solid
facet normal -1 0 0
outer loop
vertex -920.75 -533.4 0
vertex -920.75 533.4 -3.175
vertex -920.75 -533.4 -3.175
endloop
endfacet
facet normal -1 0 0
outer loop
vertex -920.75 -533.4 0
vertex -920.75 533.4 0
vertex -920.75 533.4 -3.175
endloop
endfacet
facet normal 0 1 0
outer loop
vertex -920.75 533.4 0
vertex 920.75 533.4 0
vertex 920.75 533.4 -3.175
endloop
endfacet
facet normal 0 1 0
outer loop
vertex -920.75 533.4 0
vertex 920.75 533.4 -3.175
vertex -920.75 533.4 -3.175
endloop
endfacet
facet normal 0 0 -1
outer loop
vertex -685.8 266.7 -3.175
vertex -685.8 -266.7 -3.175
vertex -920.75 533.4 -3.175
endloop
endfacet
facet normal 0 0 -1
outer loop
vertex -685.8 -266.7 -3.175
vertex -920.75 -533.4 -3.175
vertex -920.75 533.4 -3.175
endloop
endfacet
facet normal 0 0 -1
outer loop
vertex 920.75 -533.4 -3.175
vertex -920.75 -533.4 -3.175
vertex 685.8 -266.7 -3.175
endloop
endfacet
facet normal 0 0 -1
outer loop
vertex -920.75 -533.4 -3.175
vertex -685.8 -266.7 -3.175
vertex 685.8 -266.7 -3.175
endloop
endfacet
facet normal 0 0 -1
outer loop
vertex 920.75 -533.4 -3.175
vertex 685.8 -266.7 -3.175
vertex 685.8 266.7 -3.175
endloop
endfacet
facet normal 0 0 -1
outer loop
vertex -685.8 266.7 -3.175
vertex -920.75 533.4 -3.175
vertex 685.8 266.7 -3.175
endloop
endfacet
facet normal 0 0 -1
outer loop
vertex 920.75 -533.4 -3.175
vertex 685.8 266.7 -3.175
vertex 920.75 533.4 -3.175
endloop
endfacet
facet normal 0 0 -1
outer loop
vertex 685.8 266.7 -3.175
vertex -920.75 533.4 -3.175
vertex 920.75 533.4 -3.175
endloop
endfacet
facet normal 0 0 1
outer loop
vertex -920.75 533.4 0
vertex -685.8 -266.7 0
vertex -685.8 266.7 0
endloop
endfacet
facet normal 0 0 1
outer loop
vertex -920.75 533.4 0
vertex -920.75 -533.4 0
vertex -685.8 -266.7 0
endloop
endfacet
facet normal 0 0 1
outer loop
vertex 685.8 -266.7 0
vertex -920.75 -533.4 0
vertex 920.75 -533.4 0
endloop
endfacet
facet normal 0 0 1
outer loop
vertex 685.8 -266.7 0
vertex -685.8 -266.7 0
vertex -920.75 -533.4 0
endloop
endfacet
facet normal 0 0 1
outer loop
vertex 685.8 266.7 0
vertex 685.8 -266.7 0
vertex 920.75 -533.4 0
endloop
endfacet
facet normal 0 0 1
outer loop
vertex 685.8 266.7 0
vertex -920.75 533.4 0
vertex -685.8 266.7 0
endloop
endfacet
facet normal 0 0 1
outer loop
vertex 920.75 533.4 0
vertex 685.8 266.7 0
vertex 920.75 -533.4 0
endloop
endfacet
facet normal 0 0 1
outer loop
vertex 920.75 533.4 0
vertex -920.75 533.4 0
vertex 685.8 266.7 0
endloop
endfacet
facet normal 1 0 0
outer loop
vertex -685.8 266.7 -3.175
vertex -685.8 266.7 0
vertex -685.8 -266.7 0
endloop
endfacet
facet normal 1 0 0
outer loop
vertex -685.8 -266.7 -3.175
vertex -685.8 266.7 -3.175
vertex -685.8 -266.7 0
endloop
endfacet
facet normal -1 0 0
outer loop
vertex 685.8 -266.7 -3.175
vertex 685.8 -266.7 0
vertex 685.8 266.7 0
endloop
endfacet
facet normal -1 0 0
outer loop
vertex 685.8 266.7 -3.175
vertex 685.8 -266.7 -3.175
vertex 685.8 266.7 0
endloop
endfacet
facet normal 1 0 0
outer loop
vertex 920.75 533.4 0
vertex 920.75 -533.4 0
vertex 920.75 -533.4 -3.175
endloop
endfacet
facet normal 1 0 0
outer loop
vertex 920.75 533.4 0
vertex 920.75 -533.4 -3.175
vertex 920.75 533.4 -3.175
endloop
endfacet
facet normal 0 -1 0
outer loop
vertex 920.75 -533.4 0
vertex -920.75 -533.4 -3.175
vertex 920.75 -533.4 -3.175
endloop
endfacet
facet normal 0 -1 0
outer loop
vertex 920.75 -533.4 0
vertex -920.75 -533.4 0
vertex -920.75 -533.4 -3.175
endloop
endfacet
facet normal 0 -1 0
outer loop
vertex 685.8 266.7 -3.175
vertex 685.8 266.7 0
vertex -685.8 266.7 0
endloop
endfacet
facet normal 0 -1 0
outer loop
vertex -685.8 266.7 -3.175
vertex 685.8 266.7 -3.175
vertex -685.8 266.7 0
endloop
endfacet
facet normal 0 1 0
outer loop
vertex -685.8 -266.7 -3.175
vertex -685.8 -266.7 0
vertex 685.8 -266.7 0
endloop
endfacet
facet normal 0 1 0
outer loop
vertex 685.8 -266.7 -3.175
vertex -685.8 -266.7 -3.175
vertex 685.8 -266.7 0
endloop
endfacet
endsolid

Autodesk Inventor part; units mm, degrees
ref_plane "YZ Plane" through (0, 0, 0) normal (1, 0, 0) x (0, 1, 0)
ref_plane "XZ Plane" through (0, 0, 0) normal (0, 1, 0) x (-1, 0, 0)
ref_plane "XY Plane" through (0, 0, 0) normal (0, 0, 1) x (1, 0, 0)
sketch "Sketch1" plane through (0, 0, 0) normal (0, 0, 1) x (1, 0, 0)
  line L0 (-920.75, -533.4) -> (920.75, -533.4)
  line L1 (920.75, -533.4) -> (920.75, 533.4)
  line L2 (920.75, 533.4) -> (-920.75, 533.4)
  line L3 (-920.75, 533.4) -> (-920.75, -533.4)
  line L4 (-920.75, -533.4) -> (920.75, 533.4) construction
  line L5 (920.75, -533.4) -> (-920.75, 533.4) construction
  point P0 (0, 0)
  dimension "d0" = 1841.5
  dimension "d1" = 1066.8
extrude "Extrusion1" add sketch "Sketch1" against normal blind 3.175
sketch "Sketch2" plane through (0, 0, 0) normal (0, 0, 1) x (1, 0, 0)
  line L0 (-920.75, -533.4) -> (920.75, -533.4) projected
  line L1 (920.75, -533.4) -> (920.75, 533.4) projected
  line L2 (920.75, 533.4) -> (-920.75, 533.4) projected
  line L3 (-920.75, 533.4) -> (-920.75, -533.4) projected
  line L4 (-685.8, -266.7) -> (685.8, -266.7)
  line L5 (685.8, -266.7) -> (685.8, 266.7)
  line L6 (685.8, 266.7) -> (-685.8, 266.7)
  line L7 (-685.8, 266.7) -> (-685.8, -266.7)
  point P0 (0, 0)
  dimension "d4" = 234.95
  dimension "d5" = 266.7
  dimension "d6" = 234.95
  dimension "d7" = 266.7
extrude "Extrusion2" cut sketch "Sketch2" against normal through all contours L7 L6 L5 L4
properties part number "GE-13011B" material "Polyethylene, High Density"
